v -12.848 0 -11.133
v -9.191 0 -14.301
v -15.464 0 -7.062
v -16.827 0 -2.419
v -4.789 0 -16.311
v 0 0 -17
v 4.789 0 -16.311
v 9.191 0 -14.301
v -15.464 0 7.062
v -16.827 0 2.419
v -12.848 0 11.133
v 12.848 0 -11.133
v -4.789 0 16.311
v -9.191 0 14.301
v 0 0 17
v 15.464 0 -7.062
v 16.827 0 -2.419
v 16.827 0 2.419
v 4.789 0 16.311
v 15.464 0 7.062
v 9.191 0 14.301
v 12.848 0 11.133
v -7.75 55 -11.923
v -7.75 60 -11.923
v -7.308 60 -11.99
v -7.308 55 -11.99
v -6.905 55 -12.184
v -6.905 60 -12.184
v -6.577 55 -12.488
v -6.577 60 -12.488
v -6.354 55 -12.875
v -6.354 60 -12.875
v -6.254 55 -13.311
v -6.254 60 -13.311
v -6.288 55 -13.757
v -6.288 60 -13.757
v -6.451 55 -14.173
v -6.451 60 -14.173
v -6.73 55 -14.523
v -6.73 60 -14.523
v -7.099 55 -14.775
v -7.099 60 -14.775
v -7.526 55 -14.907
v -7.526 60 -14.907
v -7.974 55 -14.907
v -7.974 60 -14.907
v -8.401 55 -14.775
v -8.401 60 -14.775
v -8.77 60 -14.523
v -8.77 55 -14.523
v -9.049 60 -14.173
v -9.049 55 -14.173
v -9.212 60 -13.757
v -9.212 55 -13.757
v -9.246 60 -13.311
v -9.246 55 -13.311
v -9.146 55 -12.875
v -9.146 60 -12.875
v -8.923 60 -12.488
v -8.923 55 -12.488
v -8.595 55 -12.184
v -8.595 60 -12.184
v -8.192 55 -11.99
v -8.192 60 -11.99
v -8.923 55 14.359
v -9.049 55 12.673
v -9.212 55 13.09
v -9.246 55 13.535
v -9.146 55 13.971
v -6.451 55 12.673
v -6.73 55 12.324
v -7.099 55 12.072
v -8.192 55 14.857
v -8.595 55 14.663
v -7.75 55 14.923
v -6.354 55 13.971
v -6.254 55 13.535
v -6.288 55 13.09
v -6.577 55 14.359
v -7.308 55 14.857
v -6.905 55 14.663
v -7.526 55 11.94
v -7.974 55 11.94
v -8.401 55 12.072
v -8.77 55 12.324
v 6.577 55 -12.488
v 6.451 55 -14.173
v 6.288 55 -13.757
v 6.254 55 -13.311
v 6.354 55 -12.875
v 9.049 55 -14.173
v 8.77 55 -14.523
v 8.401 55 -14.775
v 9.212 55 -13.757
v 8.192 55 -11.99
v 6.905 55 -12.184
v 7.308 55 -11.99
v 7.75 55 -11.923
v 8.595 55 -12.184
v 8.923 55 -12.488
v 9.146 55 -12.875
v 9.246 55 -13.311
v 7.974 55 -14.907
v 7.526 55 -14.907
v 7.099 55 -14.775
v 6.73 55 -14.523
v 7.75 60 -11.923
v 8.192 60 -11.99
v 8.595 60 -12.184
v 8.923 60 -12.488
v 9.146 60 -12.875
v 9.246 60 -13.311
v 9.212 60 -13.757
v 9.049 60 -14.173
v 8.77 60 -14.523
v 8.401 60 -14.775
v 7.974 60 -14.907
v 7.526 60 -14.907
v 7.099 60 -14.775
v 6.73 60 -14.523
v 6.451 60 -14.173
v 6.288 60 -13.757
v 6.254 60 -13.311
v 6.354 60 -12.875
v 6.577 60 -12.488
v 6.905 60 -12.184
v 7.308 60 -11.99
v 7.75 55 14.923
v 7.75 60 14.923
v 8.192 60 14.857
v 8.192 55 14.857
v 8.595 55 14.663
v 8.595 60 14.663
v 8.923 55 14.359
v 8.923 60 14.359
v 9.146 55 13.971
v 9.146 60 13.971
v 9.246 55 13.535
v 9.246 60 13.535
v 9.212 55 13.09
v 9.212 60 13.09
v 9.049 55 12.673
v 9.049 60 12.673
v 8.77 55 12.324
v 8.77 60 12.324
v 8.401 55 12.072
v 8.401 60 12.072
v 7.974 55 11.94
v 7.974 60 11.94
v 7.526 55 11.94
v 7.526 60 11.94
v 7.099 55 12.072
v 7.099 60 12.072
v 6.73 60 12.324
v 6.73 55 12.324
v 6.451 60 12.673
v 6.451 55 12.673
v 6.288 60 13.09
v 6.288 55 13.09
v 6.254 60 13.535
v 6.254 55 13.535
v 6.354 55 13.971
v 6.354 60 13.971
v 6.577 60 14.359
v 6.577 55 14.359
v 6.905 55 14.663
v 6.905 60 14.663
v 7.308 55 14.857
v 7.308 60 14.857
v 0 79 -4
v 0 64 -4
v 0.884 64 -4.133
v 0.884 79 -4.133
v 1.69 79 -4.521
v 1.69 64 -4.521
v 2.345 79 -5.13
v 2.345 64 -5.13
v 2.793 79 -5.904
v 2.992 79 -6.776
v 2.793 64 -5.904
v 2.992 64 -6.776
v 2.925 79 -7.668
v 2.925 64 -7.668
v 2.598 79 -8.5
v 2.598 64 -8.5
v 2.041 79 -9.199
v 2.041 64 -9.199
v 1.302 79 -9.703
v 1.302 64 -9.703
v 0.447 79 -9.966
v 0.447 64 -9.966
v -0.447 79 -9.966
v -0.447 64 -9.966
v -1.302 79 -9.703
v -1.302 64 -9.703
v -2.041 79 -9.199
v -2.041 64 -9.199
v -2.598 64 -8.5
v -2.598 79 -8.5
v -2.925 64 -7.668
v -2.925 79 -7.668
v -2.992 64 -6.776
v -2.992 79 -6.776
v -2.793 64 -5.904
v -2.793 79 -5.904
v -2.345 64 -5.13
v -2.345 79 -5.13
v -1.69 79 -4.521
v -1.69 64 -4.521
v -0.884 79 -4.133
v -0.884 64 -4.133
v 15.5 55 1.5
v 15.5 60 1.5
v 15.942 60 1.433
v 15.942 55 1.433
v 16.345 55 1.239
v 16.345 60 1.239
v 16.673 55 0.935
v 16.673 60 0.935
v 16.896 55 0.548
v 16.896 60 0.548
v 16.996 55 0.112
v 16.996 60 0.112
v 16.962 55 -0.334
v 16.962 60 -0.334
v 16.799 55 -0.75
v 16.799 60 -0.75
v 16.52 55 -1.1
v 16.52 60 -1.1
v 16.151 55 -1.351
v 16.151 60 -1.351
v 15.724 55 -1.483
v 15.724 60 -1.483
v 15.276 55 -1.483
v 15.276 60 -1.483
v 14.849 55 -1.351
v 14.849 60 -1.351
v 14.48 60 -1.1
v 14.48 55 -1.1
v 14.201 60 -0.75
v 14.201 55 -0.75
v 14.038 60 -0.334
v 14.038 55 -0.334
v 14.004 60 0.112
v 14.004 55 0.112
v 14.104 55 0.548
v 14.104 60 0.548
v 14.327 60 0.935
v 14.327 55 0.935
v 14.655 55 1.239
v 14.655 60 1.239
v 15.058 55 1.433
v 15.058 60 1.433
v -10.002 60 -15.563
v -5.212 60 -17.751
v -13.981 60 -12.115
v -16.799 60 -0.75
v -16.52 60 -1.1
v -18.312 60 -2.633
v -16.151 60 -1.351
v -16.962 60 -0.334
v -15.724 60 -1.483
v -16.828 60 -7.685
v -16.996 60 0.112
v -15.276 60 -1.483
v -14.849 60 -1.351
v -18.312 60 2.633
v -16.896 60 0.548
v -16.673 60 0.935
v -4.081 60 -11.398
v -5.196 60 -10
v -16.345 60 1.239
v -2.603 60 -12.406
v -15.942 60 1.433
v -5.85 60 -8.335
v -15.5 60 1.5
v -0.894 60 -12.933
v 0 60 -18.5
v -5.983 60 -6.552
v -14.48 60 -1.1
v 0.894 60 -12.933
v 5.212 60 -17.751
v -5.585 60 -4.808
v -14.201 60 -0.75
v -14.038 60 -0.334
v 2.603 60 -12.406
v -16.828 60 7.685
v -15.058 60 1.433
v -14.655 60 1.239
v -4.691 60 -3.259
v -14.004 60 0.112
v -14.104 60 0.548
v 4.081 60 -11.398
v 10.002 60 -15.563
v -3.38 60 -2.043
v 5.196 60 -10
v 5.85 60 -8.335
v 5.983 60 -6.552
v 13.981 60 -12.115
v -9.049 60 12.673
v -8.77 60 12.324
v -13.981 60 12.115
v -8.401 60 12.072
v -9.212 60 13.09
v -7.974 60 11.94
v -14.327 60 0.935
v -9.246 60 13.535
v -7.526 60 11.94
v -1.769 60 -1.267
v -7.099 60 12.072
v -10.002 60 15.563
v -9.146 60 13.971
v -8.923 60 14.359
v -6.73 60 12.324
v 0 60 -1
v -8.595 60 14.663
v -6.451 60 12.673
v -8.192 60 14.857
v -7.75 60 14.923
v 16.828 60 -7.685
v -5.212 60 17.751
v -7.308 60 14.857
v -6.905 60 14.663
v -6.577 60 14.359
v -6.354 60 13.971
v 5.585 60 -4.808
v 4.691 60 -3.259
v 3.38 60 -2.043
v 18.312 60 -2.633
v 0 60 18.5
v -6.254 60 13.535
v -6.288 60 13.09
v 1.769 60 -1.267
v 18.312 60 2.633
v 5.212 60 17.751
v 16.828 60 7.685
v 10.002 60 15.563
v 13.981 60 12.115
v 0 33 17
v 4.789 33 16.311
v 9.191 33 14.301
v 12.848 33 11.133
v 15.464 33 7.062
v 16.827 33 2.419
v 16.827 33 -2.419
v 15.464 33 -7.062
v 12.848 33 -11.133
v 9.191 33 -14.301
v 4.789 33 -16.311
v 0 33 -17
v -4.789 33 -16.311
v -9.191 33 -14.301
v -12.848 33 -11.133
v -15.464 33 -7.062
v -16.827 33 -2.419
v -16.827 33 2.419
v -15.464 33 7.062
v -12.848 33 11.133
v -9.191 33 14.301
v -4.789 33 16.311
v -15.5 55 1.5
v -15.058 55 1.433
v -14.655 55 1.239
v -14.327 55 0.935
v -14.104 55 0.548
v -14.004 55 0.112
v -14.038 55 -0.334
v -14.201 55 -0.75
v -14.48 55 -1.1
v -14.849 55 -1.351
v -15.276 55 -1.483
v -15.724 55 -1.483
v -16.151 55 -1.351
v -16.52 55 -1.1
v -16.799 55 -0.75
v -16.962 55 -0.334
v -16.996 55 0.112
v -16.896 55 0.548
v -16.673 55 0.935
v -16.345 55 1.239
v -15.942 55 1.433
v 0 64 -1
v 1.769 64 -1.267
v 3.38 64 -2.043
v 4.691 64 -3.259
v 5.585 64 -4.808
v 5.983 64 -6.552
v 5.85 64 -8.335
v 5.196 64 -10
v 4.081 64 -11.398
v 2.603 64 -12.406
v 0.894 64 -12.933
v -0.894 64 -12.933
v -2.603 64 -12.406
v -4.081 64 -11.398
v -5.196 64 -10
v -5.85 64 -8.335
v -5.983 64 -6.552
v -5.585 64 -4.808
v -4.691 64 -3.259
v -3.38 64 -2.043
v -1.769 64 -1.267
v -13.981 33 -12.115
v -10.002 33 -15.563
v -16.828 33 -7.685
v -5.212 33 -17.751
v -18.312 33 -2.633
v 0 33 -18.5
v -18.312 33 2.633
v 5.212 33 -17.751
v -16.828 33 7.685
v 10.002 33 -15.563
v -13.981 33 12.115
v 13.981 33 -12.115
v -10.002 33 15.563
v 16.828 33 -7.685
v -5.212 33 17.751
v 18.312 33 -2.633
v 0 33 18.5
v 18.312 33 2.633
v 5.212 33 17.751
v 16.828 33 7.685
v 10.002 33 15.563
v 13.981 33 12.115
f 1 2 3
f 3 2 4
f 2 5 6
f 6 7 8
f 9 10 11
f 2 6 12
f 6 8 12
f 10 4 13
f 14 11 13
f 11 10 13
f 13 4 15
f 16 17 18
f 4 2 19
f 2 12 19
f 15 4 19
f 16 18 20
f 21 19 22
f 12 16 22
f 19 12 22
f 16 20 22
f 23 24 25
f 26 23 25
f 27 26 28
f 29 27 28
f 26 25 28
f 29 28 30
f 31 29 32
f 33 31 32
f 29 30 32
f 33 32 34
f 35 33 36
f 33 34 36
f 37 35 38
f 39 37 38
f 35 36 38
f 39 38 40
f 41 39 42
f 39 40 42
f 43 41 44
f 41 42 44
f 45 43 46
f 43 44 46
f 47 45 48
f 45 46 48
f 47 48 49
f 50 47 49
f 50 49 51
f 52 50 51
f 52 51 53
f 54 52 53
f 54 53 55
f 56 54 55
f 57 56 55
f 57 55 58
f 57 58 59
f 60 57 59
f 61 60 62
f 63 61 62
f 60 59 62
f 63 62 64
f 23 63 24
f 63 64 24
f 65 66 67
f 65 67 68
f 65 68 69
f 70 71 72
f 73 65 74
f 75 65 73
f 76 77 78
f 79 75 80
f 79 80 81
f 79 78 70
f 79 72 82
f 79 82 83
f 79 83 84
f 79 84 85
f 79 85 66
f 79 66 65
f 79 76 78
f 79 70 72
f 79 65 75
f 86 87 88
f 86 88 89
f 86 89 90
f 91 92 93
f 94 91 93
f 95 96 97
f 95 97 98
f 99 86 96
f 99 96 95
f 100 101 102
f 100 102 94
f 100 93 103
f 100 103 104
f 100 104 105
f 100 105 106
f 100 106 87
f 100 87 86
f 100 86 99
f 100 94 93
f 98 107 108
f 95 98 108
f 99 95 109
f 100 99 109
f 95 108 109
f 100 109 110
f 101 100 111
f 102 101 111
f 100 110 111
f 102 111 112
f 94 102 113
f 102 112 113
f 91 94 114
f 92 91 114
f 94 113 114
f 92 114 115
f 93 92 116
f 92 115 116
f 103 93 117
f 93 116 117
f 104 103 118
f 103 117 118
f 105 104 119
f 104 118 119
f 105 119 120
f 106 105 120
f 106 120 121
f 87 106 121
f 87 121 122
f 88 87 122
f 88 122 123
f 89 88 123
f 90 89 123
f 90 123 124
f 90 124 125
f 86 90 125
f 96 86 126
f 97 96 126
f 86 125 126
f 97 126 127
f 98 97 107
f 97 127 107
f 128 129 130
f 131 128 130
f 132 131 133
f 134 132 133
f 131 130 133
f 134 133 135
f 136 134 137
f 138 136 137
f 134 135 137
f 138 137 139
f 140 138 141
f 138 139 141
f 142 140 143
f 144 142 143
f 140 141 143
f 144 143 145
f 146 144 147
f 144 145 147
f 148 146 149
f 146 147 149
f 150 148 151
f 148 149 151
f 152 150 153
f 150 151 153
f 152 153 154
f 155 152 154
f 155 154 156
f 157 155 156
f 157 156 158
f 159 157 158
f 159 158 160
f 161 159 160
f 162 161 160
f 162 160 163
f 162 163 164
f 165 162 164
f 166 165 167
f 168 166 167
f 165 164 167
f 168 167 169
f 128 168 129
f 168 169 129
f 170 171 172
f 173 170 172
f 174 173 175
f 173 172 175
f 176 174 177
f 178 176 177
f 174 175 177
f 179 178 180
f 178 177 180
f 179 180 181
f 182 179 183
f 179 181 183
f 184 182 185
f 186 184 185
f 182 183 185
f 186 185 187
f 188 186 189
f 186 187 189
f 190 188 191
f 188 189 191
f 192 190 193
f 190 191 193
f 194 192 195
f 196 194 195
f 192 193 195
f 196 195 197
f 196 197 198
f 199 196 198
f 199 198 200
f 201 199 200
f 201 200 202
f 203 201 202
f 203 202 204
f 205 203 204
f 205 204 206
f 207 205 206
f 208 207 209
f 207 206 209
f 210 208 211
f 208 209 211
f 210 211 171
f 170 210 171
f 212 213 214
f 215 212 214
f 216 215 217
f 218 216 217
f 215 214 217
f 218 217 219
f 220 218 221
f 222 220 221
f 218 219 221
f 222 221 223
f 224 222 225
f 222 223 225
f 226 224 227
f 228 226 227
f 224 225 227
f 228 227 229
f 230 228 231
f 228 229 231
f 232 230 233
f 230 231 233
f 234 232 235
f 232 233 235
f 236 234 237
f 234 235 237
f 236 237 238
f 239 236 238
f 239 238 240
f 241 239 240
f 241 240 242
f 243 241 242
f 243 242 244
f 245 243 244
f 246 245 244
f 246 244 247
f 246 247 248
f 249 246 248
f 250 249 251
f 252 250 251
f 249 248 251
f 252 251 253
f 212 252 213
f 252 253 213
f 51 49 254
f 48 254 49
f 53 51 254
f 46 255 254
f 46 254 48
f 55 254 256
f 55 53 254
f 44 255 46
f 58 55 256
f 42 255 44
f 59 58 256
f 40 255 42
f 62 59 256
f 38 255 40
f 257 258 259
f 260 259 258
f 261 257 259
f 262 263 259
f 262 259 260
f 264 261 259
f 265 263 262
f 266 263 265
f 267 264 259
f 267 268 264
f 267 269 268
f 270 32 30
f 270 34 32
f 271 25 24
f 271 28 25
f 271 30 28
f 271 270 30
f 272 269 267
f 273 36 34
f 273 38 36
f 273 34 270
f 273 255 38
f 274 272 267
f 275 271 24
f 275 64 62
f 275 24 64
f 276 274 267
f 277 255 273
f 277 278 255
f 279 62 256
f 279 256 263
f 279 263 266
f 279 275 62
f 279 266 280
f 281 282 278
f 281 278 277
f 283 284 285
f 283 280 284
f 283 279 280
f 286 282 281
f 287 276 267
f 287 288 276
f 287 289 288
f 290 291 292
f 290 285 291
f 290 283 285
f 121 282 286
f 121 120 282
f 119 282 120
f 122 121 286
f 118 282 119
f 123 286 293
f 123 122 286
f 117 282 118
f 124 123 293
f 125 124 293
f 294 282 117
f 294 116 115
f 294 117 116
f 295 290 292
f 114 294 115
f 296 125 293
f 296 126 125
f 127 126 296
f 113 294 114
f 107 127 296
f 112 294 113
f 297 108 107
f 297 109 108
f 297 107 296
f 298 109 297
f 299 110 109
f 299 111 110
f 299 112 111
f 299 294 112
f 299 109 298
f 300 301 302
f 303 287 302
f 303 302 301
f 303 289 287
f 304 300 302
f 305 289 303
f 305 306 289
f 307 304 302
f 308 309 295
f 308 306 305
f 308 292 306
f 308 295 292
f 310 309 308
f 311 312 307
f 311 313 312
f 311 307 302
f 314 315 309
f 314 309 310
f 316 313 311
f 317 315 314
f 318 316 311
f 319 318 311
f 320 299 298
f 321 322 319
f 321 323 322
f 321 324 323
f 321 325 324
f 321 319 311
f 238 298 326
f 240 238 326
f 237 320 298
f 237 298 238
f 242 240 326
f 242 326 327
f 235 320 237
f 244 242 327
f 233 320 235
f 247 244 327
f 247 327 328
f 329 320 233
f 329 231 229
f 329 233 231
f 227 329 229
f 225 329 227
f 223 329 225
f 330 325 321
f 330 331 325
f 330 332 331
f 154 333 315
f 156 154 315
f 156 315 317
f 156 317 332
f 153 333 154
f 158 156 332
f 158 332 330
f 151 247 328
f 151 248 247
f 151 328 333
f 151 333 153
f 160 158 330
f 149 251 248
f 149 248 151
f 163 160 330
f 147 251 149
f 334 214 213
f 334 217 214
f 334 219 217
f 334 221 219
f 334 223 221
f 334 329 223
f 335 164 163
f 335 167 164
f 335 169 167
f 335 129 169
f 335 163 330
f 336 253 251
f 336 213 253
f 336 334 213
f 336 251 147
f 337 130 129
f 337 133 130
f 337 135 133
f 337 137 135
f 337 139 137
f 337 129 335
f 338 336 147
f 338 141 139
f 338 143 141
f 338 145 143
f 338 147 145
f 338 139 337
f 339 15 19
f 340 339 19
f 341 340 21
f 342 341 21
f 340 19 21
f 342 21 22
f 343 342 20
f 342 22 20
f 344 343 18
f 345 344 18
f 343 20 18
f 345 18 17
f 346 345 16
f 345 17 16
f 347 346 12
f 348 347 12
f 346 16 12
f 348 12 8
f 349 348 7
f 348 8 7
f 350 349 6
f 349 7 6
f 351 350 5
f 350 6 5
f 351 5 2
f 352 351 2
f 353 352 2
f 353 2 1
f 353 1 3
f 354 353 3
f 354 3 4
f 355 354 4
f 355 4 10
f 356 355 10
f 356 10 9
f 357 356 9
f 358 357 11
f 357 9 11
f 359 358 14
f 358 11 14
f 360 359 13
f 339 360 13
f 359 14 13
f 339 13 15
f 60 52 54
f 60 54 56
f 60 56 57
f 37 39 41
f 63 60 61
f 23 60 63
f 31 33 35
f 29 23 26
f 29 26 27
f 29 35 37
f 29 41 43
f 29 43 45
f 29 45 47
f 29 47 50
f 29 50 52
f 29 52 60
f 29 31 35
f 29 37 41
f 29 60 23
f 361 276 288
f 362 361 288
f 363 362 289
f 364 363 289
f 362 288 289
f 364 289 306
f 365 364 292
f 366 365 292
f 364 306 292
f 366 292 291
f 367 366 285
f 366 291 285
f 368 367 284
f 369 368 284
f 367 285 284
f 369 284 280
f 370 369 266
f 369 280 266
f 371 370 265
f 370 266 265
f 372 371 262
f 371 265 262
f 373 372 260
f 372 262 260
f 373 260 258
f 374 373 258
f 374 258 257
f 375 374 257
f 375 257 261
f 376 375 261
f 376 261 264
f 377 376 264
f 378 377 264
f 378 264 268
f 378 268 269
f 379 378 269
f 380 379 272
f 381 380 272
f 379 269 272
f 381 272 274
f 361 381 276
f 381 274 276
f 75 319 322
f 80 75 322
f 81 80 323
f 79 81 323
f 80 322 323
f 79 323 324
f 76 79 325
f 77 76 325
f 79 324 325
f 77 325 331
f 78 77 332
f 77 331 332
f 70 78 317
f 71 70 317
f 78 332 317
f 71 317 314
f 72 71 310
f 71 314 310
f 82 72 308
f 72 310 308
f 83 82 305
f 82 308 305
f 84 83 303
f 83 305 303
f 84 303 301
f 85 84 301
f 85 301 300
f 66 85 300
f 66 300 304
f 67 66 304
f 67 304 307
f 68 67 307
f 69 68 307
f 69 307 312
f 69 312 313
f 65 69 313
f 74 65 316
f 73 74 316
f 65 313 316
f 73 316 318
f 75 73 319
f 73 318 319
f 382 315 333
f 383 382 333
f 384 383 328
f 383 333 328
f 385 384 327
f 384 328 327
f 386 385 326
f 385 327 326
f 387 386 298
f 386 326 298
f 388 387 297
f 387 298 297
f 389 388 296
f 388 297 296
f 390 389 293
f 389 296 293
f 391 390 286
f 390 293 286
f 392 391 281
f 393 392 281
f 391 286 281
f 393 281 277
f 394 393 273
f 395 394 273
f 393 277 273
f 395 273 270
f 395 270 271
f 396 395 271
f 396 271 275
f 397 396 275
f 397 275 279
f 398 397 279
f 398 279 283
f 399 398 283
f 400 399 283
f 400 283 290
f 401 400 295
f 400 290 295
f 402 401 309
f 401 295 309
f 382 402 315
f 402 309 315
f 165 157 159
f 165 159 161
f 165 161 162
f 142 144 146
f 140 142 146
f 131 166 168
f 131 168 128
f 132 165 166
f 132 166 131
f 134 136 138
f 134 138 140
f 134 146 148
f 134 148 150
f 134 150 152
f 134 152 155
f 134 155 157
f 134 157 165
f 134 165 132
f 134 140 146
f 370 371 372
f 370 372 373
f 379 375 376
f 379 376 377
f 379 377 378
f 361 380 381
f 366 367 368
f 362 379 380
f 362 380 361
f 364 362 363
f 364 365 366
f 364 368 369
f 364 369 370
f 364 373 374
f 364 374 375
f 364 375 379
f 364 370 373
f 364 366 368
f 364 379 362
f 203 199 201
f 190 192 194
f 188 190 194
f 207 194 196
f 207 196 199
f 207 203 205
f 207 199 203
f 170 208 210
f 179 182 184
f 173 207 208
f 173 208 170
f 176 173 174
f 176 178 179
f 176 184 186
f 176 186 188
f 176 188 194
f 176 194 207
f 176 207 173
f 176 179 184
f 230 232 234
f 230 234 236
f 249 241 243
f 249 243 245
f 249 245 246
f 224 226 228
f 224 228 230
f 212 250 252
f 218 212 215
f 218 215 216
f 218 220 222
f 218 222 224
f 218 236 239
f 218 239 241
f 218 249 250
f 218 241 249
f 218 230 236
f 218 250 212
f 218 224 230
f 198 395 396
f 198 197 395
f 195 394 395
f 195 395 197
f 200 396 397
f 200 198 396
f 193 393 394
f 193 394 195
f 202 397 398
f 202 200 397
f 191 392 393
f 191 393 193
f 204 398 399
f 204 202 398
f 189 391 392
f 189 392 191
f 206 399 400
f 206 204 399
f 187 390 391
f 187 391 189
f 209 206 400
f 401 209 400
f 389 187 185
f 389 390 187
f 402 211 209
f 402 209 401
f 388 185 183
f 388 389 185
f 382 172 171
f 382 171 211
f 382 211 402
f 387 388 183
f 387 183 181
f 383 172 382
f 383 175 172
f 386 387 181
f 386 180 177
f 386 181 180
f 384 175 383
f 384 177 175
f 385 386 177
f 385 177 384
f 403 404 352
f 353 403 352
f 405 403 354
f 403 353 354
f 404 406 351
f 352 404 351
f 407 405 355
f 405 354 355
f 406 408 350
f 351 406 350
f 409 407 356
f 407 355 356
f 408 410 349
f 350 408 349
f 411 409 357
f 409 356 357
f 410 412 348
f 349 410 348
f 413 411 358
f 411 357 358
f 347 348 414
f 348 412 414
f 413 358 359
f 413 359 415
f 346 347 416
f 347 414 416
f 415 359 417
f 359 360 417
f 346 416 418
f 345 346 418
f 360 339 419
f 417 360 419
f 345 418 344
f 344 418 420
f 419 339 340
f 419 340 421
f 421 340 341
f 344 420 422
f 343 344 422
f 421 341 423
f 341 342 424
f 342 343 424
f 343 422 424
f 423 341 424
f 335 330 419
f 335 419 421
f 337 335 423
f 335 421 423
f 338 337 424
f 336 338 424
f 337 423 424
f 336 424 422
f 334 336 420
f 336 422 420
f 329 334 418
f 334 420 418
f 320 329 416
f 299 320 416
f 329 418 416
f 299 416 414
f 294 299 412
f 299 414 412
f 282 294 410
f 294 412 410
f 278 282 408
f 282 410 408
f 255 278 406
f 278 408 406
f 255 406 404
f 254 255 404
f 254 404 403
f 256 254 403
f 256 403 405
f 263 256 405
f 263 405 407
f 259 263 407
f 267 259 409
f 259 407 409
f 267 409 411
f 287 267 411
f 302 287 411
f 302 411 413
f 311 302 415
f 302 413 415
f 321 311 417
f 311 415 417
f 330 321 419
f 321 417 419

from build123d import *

# Parameters (mm, degrees)
SKETCH_1_R          = 17
EXTRUDE_1_DEPTH     = 33
SKETCH_2_R          = 18.5
EXTRUDE_2_DEPTH     = 27
SKETCH_3_R          = 6
EXTRUDE_3_DEPTH     = 4
SKETCH_4_R          = 3
EXTRUDE_5_DEPTH     = 15
SKETCH_6_R          = 1.5
CUT_EXTRUDE_1_DEPTH = 5


with BuildPart() as part:
    # 草图1 → 凸台-拉伸1 (new body)
    with BuildSketch(Plane(origin=(0, 0, 0), x_dir=(1, 0, 0), z_dir=(0, 1, 0))):
        with Locations(Location((0, 0, 0), (0, 0, 270))):
            Circle(SKETCH_1_R)
    extrude(amount=EXTRUDE_1_DEPTH)

    # 草图2 → 凸台-拉伸2 (add)
    with BuildSketch(Plane(origin=(0, 33, 0), x_dir=(1, 0, 0), z_dir=(0, 1, 0))):
        with Locations(Location((0, 0, 0), (0, 0, 270))):
            Circle(SKETCH_2_R)
    extrude(amount=EXTRUDE_2_DEPTH)

    # 草图3 → 凸台-拉伸3 (add)
    with BuildSketch(Plane(origin=(0, 60, 0), x_dir=(1, 0, 0), z_dir=(0, 1, 0))):
        with Locations(Location((0, 7, 0), (0, 0, 270))):
            Circle(SKETCH_3_R)
    extrude(amount=EXTRUDE_3_DEPTH)

    # 草图4 → 凸台-拉伸5 (add)
    with BuildSketch(Plane(origin=(0, 64, 0), x_dir=(1, 0, 0), z_dir=(0, 1, 0))):
        with Locations(Location((0, 7, 0), (0, 0, 270))):
            Circle(SKETCH_4_R)
    extrude(amount=EXTRUDE_5_DEPTH)

    # 草图6 → 切除-拉伸1 (cut)
    with BuildSketch(Plane(origin=(0, 60, 0), x_dir=(1, 0, 0), z_dir=(0, 1, 0))):
        with Locations(Location((7.75, 13.423393759, 0), (0, 0, 270))):
            Circle(SKETCH_6_R)
        with Locations(Location((15.5, 0, 0), (0, 0, 270))):
            Circle(SKETCH_6_R)
        with Locations(Location((7.75, -13.423393759, 0), (0, 0, 270))):
            Circle(SKETCH_6_R)
        with Locations(Location((-7.75, -13.423393759, 0), (0, 0, 270))):
            Circle(SKETCH_6_R)
        with Locations(Location((-15.5, 0, 0), (0, 0, 270))):
            Circle(SKETCH_6_R)
        with Locations(Location((-7.75, 13.423393759, 0), (0, 0, 270))):
            Circle(SKETCH_6_R)
    extrude(amount=-CUT_EXTRUDE_1_DEPTH, mode=Mode.SUBTRACT)


solid = part.part
